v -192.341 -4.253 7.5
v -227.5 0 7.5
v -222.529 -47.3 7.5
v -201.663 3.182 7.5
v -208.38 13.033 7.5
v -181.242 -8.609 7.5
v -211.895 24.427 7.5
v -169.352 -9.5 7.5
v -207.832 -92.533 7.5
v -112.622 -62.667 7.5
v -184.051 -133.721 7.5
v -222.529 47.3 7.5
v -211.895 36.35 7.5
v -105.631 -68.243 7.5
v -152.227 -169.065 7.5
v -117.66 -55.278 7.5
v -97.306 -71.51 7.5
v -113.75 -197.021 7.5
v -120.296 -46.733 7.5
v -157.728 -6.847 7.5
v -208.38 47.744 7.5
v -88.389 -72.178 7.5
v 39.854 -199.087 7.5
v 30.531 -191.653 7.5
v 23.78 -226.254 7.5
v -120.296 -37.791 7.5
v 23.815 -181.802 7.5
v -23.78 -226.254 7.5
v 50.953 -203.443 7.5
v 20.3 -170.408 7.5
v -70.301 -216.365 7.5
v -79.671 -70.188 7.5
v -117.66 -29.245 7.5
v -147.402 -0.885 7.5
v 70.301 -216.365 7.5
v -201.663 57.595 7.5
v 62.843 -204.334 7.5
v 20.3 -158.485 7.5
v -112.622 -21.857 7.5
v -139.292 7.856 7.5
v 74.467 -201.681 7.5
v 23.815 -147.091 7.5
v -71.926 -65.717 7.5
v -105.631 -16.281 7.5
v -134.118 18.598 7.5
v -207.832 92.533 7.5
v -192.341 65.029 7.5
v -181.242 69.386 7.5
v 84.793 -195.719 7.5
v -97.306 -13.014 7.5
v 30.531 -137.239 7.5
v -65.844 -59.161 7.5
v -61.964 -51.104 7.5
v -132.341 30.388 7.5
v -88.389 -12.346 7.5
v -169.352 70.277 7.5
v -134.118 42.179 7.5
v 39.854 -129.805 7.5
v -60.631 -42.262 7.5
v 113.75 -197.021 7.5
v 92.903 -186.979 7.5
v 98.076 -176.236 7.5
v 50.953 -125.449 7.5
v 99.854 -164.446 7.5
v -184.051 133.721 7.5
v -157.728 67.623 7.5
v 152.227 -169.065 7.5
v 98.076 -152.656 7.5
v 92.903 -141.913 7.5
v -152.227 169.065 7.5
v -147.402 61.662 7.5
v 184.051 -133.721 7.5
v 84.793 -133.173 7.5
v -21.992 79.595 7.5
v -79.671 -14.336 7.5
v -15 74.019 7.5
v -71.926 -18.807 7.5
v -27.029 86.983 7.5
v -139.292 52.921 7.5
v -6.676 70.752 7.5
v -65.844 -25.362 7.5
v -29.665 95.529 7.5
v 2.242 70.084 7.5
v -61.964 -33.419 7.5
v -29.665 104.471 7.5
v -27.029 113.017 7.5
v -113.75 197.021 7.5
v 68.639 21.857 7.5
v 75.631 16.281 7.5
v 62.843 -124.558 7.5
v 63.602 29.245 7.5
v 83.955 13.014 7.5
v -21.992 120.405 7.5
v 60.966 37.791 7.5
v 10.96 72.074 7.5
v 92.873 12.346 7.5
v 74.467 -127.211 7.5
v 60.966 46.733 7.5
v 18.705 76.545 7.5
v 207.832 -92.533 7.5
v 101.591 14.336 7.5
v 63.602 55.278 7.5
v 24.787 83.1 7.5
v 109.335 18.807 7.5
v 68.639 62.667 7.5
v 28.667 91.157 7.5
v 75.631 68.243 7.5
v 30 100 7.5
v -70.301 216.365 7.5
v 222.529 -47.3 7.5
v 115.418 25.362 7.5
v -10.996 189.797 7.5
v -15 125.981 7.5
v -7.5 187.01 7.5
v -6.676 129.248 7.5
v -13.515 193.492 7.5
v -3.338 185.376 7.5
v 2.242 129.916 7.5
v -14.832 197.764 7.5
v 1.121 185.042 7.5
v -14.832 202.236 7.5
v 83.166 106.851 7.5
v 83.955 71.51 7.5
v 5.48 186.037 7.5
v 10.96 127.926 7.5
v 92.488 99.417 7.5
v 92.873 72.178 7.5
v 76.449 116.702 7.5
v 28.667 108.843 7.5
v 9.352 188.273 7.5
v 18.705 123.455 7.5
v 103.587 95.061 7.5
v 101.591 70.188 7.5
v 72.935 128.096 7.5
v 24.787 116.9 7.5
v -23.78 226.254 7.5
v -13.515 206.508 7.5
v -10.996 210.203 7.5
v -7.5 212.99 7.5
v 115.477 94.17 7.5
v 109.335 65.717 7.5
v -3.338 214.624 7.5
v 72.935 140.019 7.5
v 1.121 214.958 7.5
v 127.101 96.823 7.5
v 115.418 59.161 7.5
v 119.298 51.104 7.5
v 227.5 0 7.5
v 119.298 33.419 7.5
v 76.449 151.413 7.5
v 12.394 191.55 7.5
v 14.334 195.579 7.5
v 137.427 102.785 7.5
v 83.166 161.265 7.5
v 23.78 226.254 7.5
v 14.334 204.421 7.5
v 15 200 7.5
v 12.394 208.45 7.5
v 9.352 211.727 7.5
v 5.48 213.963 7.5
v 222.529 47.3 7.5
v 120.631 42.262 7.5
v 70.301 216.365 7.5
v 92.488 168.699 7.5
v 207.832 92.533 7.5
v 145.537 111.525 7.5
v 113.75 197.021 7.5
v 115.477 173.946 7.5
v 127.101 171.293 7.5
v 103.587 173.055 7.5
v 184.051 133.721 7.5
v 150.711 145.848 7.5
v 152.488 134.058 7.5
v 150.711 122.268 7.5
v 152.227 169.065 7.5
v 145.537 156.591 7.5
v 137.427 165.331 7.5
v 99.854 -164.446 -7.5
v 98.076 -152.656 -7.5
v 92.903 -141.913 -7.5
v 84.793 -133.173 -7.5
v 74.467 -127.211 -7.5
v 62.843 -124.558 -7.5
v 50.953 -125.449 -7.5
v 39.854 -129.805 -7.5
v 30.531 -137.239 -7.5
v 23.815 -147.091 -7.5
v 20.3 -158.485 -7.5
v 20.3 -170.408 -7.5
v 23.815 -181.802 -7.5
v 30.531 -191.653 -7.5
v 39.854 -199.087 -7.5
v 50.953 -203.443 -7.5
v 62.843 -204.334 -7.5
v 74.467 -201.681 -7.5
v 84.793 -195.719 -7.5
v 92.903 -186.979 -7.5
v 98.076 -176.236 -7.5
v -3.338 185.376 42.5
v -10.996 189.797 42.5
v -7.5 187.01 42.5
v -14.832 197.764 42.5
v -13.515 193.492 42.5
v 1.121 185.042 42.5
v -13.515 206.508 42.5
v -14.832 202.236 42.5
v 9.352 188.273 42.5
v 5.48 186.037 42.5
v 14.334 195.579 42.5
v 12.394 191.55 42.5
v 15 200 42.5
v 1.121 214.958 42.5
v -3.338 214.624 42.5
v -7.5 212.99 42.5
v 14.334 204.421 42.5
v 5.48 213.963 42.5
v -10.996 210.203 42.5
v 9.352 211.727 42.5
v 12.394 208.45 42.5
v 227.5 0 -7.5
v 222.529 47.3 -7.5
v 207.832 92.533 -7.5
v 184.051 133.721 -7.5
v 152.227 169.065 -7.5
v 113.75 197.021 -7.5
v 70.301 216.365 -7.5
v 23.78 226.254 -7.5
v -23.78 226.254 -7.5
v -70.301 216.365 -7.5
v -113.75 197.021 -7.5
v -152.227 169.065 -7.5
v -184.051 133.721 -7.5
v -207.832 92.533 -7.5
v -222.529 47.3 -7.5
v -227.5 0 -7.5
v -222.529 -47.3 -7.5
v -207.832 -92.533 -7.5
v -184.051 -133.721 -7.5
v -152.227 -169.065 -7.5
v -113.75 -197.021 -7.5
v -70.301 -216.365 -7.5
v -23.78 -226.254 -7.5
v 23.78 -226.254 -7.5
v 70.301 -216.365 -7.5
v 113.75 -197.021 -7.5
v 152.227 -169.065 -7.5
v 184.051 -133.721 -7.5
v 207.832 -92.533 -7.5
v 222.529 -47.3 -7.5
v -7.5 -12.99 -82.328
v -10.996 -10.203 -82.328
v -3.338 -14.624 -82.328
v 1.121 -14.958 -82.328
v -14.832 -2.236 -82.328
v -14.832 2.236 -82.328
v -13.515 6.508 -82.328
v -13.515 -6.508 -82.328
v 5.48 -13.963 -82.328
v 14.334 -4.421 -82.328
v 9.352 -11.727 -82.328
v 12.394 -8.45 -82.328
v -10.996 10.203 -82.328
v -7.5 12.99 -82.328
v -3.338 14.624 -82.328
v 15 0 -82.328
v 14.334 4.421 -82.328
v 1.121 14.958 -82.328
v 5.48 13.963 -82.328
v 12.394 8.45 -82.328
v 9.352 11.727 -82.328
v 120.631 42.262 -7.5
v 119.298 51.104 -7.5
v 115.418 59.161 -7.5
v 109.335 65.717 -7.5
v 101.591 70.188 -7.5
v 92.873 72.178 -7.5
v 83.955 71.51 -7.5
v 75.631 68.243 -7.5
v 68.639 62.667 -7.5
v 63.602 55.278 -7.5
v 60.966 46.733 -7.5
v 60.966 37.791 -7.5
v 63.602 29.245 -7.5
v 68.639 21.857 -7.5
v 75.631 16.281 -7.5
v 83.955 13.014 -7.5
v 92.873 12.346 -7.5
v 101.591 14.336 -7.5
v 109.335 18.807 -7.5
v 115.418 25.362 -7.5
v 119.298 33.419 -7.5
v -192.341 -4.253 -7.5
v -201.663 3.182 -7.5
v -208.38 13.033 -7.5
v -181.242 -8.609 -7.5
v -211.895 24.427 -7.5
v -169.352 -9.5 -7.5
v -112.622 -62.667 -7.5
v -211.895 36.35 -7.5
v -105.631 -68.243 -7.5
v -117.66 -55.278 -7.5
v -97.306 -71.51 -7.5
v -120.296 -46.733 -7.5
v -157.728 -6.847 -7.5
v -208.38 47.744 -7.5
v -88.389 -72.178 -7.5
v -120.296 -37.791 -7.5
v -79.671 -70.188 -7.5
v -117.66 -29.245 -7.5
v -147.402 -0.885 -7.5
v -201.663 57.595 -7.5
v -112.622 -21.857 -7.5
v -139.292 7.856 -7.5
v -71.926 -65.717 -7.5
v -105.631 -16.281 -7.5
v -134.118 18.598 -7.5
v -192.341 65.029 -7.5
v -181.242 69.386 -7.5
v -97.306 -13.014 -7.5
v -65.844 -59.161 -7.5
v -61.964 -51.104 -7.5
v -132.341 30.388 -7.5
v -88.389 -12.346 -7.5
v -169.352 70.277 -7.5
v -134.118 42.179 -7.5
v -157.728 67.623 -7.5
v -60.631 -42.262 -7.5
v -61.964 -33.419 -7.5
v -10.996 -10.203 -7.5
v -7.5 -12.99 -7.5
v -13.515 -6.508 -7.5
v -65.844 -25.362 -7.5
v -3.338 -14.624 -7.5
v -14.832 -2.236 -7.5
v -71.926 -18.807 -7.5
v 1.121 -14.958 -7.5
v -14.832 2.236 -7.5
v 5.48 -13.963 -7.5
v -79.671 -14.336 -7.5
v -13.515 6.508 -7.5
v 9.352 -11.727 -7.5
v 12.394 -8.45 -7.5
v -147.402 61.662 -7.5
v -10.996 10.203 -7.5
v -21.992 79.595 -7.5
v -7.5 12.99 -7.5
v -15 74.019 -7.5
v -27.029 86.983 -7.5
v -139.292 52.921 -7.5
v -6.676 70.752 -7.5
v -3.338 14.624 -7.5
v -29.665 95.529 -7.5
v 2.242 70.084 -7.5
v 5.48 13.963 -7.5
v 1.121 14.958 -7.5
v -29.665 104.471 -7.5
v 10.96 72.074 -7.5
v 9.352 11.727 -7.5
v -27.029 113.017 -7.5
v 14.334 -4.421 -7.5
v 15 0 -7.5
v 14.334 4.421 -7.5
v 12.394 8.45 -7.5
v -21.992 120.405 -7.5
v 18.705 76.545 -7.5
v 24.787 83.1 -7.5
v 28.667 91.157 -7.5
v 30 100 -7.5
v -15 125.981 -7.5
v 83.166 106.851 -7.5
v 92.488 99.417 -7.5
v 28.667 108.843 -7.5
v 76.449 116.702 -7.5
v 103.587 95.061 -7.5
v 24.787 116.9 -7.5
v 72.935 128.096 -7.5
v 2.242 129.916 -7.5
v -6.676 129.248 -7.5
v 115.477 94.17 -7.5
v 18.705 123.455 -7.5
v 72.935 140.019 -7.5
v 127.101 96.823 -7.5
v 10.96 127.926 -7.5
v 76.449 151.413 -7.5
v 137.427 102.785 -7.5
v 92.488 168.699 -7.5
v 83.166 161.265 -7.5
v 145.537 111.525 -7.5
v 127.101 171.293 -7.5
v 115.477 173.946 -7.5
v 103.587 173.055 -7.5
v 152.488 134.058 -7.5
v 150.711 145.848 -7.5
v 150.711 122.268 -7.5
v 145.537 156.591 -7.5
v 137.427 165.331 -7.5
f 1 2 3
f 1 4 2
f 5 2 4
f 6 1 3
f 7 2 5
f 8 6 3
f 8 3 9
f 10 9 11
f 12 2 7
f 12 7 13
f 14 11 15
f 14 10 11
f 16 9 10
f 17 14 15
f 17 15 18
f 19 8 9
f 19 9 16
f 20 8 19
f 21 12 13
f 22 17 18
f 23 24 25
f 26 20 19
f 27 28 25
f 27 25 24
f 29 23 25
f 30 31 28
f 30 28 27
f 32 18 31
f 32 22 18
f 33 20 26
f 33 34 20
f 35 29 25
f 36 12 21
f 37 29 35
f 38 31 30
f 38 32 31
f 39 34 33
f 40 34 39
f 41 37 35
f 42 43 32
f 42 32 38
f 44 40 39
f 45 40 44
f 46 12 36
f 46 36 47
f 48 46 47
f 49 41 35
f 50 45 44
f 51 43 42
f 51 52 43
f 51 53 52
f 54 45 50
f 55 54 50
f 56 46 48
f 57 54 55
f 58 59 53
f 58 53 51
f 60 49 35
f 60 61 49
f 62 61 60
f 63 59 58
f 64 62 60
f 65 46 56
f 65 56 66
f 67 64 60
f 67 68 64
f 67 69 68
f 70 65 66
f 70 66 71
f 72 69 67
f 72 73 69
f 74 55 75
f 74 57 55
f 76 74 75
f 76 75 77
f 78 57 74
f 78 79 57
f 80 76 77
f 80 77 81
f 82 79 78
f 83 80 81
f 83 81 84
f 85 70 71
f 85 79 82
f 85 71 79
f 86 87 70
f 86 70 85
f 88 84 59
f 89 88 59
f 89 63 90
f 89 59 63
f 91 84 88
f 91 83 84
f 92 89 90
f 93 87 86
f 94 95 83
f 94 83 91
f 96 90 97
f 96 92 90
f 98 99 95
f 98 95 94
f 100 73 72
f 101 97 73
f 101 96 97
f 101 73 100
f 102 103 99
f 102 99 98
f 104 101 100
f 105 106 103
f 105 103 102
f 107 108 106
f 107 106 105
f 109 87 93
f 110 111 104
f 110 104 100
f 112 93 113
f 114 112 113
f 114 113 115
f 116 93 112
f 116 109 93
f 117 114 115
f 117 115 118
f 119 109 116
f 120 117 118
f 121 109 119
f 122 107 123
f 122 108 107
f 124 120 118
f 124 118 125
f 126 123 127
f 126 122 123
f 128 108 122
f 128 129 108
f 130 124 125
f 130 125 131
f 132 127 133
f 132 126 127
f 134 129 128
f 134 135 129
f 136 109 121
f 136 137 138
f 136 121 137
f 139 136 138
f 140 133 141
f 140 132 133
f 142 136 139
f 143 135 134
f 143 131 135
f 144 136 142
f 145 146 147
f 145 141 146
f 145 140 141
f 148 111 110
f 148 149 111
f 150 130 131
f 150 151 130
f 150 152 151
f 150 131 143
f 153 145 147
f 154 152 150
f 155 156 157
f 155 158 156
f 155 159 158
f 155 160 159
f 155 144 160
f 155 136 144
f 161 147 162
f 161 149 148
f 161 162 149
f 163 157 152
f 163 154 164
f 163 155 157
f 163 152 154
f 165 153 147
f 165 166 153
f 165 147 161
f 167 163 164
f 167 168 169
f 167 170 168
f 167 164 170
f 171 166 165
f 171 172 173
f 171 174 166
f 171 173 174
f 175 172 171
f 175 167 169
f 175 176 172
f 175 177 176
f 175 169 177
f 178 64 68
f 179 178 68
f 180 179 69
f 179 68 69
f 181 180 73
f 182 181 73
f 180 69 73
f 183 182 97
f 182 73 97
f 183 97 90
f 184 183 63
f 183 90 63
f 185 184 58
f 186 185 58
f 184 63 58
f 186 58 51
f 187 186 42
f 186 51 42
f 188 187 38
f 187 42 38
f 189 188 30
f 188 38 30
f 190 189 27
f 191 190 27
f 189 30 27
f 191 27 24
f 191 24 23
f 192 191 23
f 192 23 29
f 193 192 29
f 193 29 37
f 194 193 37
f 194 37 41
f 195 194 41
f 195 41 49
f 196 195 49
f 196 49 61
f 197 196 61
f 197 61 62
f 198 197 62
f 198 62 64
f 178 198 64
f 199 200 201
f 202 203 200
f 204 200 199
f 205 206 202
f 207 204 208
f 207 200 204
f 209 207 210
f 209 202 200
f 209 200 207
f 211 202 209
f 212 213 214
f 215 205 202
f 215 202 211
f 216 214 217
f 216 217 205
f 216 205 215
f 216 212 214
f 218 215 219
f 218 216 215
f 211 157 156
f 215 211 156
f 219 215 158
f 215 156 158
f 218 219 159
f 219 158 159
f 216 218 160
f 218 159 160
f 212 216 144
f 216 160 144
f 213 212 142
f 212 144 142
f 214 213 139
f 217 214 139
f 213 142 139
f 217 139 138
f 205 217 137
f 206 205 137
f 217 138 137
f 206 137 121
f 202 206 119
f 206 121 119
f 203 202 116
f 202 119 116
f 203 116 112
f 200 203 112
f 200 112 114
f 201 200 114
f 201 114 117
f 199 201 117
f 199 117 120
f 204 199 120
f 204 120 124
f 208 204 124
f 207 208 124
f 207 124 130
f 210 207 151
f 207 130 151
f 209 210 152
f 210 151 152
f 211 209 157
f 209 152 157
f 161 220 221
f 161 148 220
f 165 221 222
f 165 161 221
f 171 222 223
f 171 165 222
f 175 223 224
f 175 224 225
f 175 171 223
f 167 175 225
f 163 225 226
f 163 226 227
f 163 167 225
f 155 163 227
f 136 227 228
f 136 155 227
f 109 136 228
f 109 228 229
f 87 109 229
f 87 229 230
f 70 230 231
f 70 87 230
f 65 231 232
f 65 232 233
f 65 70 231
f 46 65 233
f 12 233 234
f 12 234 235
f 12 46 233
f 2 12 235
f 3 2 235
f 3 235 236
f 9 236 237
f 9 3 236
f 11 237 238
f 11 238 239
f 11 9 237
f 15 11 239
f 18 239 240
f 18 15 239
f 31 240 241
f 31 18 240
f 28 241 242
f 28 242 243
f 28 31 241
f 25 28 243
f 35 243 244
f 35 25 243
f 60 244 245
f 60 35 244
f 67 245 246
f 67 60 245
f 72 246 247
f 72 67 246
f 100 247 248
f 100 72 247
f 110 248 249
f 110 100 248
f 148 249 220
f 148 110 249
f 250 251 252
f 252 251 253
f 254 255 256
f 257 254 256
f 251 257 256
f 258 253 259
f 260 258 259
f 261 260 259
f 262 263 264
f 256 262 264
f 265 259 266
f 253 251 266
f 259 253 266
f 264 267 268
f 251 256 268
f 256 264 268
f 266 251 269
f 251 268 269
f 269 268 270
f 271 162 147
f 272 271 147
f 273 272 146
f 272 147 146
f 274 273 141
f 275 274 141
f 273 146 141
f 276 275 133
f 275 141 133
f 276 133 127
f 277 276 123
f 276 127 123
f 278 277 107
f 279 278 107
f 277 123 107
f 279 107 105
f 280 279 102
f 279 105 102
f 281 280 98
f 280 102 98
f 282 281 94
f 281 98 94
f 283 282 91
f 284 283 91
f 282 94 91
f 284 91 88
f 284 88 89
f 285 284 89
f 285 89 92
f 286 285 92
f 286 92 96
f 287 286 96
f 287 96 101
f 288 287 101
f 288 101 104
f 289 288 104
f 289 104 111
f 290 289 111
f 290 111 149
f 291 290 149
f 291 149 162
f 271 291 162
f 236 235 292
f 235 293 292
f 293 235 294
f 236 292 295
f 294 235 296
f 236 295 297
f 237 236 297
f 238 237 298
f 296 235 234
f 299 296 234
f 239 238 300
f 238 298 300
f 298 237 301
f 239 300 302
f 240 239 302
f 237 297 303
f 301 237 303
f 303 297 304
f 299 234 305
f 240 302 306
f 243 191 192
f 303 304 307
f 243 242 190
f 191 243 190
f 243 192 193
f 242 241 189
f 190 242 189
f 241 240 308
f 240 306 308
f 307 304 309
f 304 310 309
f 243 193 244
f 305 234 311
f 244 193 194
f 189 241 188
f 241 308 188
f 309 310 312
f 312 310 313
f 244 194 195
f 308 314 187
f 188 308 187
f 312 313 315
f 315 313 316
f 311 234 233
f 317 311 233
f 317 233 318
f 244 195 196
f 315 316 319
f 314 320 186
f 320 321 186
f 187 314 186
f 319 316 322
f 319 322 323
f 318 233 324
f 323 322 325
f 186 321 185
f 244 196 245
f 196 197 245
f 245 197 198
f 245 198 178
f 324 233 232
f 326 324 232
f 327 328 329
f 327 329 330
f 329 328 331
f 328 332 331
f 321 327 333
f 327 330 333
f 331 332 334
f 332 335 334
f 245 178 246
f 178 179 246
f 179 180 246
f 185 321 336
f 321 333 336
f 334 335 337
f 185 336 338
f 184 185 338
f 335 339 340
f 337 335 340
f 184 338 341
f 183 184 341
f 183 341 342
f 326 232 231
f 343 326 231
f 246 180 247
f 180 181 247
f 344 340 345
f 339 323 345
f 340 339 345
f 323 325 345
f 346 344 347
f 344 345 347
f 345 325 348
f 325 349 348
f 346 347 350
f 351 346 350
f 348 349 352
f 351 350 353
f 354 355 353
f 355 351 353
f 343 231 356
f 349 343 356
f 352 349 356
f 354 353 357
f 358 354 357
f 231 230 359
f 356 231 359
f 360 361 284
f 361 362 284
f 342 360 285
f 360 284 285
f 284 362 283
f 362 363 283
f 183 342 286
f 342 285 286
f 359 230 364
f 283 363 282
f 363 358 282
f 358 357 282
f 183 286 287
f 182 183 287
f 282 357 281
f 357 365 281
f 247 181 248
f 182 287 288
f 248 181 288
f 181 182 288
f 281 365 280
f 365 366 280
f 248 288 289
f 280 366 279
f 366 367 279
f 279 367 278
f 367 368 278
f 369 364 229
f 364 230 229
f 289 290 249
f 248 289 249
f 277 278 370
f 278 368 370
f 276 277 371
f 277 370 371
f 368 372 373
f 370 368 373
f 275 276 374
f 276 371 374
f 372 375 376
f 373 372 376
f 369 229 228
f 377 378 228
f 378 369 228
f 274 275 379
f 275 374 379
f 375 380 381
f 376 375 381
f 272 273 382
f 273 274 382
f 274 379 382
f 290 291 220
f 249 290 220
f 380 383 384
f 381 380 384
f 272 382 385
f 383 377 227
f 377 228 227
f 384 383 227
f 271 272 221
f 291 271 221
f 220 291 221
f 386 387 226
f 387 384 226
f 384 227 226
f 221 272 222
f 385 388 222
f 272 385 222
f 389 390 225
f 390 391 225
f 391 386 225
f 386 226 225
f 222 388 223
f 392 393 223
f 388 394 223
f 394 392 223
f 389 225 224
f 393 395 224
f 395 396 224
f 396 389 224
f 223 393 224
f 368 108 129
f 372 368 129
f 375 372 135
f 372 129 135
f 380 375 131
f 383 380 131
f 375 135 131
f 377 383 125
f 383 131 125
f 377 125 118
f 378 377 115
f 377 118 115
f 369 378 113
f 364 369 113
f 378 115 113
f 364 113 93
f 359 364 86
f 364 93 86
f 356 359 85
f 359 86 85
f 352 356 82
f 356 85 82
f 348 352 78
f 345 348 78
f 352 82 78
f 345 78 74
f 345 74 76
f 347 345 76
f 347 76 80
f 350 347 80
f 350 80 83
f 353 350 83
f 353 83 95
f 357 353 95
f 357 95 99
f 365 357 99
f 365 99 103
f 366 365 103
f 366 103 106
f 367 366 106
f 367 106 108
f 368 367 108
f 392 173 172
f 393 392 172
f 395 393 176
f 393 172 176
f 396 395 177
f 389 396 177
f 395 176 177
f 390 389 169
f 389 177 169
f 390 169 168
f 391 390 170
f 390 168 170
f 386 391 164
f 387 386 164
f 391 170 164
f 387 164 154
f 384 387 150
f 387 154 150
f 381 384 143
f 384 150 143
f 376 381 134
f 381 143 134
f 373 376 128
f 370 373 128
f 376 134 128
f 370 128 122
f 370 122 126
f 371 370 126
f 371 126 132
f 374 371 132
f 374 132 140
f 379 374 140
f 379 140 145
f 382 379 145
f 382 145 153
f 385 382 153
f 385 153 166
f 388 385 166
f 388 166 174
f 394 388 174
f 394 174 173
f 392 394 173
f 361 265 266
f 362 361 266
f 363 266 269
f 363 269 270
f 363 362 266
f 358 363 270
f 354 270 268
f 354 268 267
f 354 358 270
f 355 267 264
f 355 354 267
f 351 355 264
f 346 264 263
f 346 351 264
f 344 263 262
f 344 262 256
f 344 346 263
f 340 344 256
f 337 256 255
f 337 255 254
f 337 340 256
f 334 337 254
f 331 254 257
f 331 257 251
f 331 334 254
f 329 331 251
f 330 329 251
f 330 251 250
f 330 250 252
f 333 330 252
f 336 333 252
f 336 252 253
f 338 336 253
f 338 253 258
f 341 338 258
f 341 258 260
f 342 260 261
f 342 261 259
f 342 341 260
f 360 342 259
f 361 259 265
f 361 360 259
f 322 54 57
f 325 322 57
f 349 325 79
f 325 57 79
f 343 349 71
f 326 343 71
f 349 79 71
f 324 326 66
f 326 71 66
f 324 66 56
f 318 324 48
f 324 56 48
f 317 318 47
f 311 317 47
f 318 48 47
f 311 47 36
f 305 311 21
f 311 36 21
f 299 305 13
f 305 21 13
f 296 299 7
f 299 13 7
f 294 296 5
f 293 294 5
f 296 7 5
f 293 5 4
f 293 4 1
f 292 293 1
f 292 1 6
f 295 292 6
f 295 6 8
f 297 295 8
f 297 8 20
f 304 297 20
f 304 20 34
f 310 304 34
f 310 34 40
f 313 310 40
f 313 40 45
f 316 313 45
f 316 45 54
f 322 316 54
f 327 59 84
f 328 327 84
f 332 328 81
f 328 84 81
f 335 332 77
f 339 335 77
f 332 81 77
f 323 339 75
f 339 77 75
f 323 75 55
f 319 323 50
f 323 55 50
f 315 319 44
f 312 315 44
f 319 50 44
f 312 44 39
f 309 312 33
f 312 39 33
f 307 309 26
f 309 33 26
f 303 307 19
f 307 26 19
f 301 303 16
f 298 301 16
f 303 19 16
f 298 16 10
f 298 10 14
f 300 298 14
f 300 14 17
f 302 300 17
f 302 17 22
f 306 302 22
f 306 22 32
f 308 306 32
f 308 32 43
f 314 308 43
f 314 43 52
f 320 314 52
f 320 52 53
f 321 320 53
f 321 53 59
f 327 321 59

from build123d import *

# Parameters (mm, degrees)
SKETCH1_R           = 227.5
BOSS_EXTRUDE1_DEPTH = 7.5
BOSS_EXTRUDE2_START = 7.5
SKETCH1_3_R         = 15
BOSS_EXTRUDE2_DEPTH = 35
SKETCH2_R           = 40
SKETCH2_R_2         = 30
CUT_EXTRUDE1_DEPTH  = 16
BOSS_EXTRUDE3_START = -7.5
SKETCH3_R           = 15
BOSS_EXTRUDE3_DEPTH = 74.827954589


with BuildPart() as part:
    # Sketch1 → Boss-Extrude1 (new body, symmetric)
    with BuildSketch(Plane.XY):
        Circle(SKETCH1_R)
    extrude(amount=BOSS_EXTRUDE1_DEPTH, both=True)

    # Sketch1<3> → Boss-Extrude2 (add)
    with BuildSketch(Plane.XY.offset(BOSS_EXTRUDE2_START)):
        with Locations((0, 200)):
            Circle(SKETCH1_3_R)
    extrude(amount=BOSS_EXTRUDE2_DEPTH)

    # Sketch2 → Cut-Extrude1 (cut, through all)
    with BuildSketch(Plane.XY.offset(7.5)):
        with Locations((-172.341356777, 30.388431092)):
            Circle(SKETCH2_R)
        with Locations((0, 100)):
            Circle(SKETCH2_R_2)
        with Locations((90.630778704, 42.261826174)):
            Circle(SKETCH2_R_2)
        with Locations((-90.630778704, -42.261826174)):
            Circle(SKETCH2_R_2)
        with Locations((112.487831695, 134.057777546)):
            Circle(SKETCH2_R)
        with Locations((59.853525082, -164.446208638)):
            Circle(SKETCH2_R)
    extrude(amount=-CUT_EXTRUDE1_DEPTH, mode=Mode.SUBTRACT)

    # Sketch3 → Boss-Extrude3 (add)
    with BuildSketch(Plane.XY.offset(BOSS_EXTRUDE3_START)):
        Circle(SKETCH3_R)
    extrude(amount=-BOSS_EXTRUDE3_DEPTH)


solid = part.part
